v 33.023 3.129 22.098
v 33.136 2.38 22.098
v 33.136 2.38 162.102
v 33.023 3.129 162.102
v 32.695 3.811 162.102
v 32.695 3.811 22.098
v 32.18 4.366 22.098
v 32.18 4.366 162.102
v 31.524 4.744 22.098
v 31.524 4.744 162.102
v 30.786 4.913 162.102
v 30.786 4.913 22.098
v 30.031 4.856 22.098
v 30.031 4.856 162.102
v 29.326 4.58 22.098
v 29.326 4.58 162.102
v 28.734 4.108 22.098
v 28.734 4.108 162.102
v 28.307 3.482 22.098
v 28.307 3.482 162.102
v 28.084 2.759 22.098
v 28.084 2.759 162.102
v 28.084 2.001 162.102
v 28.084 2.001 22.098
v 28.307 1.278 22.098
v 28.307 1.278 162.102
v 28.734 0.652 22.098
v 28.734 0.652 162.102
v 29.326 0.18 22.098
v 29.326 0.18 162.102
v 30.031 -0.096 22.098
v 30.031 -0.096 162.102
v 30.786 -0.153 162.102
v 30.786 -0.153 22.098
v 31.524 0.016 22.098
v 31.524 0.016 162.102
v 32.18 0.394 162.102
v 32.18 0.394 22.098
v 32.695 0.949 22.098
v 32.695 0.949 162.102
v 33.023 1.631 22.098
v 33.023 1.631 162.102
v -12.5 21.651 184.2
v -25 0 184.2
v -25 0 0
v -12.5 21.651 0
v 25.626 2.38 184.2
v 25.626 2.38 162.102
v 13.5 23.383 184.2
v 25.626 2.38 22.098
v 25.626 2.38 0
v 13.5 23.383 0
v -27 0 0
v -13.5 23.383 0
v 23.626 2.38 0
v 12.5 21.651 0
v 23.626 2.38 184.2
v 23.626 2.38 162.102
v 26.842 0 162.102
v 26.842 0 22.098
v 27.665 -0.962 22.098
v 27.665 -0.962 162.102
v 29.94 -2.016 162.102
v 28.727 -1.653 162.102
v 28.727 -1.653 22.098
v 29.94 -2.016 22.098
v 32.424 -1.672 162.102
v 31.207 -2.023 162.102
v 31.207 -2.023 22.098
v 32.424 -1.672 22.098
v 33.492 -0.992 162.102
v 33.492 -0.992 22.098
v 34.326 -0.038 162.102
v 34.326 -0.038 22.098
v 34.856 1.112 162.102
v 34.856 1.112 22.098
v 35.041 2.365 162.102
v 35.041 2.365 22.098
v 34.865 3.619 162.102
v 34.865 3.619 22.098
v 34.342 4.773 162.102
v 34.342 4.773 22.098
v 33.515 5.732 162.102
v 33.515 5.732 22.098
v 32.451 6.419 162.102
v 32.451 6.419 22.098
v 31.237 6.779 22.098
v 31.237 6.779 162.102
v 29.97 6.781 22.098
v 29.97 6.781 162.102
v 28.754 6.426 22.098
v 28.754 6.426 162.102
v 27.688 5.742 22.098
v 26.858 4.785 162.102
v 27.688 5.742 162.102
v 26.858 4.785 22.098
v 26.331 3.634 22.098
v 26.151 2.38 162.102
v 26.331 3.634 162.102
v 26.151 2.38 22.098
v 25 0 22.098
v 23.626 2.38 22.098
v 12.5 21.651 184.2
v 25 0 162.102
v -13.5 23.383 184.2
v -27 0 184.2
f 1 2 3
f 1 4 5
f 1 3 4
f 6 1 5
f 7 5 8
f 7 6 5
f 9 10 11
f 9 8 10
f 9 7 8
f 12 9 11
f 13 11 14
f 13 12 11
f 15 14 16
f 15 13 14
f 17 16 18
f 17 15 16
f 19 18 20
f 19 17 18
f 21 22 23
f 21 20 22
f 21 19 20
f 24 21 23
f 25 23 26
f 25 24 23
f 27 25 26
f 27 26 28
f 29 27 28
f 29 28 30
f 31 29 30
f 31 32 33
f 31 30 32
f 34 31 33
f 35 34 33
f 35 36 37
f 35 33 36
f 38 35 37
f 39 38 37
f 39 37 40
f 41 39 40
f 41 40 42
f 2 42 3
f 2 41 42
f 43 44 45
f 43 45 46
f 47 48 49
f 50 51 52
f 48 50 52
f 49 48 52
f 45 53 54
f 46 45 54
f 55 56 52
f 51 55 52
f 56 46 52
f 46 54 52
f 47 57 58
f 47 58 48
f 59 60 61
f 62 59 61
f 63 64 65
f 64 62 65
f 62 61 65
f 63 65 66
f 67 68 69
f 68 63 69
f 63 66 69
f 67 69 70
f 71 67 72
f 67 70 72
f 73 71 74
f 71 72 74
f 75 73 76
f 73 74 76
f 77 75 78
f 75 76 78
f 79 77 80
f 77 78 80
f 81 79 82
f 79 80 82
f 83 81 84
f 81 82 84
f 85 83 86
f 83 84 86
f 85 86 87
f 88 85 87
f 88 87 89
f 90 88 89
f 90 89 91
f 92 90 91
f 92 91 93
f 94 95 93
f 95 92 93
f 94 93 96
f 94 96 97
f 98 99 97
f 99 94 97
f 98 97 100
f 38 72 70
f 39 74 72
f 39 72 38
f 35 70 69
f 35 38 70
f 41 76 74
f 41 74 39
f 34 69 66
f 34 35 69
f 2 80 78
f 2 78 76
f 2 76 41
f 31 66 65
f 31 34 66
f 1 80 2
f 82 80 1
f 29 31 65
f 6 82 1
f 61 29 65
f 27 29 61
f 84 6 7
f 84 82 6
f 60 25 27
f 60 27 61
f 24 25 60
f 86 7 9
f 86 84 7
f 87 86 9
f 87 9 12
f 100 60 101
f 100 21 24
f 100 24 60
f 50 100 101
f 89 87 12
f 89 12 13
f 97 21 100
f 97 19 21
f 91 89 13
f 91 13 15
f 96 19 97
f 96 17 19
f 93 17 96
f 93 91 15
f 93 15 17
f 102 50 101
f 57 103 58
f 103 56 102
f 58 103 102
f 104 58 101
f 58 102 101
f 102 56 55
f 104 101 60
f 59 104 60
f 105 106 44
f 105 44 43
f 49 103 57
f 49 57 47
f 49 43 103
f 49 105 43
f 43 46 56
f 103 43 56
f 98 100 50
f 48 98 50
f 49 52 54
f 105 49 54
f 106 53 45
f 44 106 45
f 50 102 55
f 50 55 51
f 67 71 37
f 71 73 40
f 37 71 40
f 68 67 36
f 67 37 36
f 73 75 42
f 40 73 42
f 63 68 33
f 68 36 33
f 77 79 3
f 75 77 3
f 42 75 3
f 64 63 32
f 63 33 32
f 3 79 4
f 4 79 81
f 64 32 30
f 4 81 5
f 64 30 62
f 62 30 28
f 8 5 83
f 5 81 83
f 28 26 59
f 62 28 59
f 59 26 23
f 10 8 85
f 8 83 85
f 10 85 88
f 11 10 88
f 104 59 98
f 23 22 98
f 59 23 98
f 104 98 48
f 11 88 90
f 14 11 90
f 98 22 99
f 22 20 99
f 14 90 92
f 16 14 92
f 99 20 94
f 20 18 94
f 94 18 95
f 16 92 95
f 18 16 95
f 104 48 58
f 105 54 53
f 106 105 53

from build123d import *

# Parameters (mm, degrees)
SKETCH1_R           = 2.54
BOSS_EXTRUDE1_DEPTH = 184.2
CUT_EXTRUDE4_START  = -22.098
CUT_EXTRUDE4_DEPTH  = 22.098
CUT_EXTRUDE5_DEPTH  = 22.098


with BuildPart() as part:
    # Sketch1 → Boss-Extrude1 (new body)
    with BuildSketch(Plane.XY):
        with BuildLine():
            Line((-13.5, 23.382685902), (-27, 0))
            Line((-27, 0), (-25, 0))
            Line((-25, 0), (-12.5, 21.650635095))
            Line((-12.5, 21.650635095), (12.5, 21.650635095))
            Line((12.5, 21.650635095), (25, 0))
            Line((25, 0), (26.841758653, 0))
            ThreePointArc((26.841758653, 0), (34.864700777, 3.619120342), (26.150906359, 2.38))
            Line((26.150906359, 2.38), (25.625906359, 2.38))
            Line((25.625906359, 2.38), (13.5, 23.382685902))
            Line((13.5, 23.382685902), (-13.5, 23.382685902))
        make_face()
        with Locations((30.595906359, 2.38)):
            Circle(SKETCH1_R, mode=Mode.SUBTRACT)
    extrude(amount=BOSS_EXTRUDE1_DEPTH)

    # Sketch5 → Cut-Extrude4 (cut)
    with BuildSketch(Plane.XY.offset(184.2).offset(CUT_EXTRUDE4_START)):
        with BuildLine():
            Line((23.625906359, 2.38), (26.150906359, 2.38))
            ThreePointArc((26.150906359, 2.38), (34.864700777, 3.619120342), (26.841758653, 0))
            Line((26.841758653, 0), (25, 0))
            Line((25, 0), (23.625906359, 2.38))
        make_face()
    extrude(amount=CUT_EXTRUDE4_DEPTH, mode=Mode.SUBTRACT)

    # Sketch6 → Cut-Extrude5 (cut)
    with BuildSketch(Plane(origin=(0, 0, 0), x_dir=(-1, 0, 0), z_dir=(0, 0, -1))):
        with BuildLine():
            Line((-23.625906359, 2.38), (-26.150906359, 2.38))
            ThreePointArc((-26.150906359, 2.38), (-34.864700777, 3.619120342), (-26.841758653, 0))
            Line((-26.841758653, 0), (-25, 0))
            Line((-25, 0), (-23.625906359, 2.38))
        make_face()
    extrude(amount=-CUT_EXTRUDE5_DEPTH, mode=Mode.SUBTRACT)


solid = part.part
